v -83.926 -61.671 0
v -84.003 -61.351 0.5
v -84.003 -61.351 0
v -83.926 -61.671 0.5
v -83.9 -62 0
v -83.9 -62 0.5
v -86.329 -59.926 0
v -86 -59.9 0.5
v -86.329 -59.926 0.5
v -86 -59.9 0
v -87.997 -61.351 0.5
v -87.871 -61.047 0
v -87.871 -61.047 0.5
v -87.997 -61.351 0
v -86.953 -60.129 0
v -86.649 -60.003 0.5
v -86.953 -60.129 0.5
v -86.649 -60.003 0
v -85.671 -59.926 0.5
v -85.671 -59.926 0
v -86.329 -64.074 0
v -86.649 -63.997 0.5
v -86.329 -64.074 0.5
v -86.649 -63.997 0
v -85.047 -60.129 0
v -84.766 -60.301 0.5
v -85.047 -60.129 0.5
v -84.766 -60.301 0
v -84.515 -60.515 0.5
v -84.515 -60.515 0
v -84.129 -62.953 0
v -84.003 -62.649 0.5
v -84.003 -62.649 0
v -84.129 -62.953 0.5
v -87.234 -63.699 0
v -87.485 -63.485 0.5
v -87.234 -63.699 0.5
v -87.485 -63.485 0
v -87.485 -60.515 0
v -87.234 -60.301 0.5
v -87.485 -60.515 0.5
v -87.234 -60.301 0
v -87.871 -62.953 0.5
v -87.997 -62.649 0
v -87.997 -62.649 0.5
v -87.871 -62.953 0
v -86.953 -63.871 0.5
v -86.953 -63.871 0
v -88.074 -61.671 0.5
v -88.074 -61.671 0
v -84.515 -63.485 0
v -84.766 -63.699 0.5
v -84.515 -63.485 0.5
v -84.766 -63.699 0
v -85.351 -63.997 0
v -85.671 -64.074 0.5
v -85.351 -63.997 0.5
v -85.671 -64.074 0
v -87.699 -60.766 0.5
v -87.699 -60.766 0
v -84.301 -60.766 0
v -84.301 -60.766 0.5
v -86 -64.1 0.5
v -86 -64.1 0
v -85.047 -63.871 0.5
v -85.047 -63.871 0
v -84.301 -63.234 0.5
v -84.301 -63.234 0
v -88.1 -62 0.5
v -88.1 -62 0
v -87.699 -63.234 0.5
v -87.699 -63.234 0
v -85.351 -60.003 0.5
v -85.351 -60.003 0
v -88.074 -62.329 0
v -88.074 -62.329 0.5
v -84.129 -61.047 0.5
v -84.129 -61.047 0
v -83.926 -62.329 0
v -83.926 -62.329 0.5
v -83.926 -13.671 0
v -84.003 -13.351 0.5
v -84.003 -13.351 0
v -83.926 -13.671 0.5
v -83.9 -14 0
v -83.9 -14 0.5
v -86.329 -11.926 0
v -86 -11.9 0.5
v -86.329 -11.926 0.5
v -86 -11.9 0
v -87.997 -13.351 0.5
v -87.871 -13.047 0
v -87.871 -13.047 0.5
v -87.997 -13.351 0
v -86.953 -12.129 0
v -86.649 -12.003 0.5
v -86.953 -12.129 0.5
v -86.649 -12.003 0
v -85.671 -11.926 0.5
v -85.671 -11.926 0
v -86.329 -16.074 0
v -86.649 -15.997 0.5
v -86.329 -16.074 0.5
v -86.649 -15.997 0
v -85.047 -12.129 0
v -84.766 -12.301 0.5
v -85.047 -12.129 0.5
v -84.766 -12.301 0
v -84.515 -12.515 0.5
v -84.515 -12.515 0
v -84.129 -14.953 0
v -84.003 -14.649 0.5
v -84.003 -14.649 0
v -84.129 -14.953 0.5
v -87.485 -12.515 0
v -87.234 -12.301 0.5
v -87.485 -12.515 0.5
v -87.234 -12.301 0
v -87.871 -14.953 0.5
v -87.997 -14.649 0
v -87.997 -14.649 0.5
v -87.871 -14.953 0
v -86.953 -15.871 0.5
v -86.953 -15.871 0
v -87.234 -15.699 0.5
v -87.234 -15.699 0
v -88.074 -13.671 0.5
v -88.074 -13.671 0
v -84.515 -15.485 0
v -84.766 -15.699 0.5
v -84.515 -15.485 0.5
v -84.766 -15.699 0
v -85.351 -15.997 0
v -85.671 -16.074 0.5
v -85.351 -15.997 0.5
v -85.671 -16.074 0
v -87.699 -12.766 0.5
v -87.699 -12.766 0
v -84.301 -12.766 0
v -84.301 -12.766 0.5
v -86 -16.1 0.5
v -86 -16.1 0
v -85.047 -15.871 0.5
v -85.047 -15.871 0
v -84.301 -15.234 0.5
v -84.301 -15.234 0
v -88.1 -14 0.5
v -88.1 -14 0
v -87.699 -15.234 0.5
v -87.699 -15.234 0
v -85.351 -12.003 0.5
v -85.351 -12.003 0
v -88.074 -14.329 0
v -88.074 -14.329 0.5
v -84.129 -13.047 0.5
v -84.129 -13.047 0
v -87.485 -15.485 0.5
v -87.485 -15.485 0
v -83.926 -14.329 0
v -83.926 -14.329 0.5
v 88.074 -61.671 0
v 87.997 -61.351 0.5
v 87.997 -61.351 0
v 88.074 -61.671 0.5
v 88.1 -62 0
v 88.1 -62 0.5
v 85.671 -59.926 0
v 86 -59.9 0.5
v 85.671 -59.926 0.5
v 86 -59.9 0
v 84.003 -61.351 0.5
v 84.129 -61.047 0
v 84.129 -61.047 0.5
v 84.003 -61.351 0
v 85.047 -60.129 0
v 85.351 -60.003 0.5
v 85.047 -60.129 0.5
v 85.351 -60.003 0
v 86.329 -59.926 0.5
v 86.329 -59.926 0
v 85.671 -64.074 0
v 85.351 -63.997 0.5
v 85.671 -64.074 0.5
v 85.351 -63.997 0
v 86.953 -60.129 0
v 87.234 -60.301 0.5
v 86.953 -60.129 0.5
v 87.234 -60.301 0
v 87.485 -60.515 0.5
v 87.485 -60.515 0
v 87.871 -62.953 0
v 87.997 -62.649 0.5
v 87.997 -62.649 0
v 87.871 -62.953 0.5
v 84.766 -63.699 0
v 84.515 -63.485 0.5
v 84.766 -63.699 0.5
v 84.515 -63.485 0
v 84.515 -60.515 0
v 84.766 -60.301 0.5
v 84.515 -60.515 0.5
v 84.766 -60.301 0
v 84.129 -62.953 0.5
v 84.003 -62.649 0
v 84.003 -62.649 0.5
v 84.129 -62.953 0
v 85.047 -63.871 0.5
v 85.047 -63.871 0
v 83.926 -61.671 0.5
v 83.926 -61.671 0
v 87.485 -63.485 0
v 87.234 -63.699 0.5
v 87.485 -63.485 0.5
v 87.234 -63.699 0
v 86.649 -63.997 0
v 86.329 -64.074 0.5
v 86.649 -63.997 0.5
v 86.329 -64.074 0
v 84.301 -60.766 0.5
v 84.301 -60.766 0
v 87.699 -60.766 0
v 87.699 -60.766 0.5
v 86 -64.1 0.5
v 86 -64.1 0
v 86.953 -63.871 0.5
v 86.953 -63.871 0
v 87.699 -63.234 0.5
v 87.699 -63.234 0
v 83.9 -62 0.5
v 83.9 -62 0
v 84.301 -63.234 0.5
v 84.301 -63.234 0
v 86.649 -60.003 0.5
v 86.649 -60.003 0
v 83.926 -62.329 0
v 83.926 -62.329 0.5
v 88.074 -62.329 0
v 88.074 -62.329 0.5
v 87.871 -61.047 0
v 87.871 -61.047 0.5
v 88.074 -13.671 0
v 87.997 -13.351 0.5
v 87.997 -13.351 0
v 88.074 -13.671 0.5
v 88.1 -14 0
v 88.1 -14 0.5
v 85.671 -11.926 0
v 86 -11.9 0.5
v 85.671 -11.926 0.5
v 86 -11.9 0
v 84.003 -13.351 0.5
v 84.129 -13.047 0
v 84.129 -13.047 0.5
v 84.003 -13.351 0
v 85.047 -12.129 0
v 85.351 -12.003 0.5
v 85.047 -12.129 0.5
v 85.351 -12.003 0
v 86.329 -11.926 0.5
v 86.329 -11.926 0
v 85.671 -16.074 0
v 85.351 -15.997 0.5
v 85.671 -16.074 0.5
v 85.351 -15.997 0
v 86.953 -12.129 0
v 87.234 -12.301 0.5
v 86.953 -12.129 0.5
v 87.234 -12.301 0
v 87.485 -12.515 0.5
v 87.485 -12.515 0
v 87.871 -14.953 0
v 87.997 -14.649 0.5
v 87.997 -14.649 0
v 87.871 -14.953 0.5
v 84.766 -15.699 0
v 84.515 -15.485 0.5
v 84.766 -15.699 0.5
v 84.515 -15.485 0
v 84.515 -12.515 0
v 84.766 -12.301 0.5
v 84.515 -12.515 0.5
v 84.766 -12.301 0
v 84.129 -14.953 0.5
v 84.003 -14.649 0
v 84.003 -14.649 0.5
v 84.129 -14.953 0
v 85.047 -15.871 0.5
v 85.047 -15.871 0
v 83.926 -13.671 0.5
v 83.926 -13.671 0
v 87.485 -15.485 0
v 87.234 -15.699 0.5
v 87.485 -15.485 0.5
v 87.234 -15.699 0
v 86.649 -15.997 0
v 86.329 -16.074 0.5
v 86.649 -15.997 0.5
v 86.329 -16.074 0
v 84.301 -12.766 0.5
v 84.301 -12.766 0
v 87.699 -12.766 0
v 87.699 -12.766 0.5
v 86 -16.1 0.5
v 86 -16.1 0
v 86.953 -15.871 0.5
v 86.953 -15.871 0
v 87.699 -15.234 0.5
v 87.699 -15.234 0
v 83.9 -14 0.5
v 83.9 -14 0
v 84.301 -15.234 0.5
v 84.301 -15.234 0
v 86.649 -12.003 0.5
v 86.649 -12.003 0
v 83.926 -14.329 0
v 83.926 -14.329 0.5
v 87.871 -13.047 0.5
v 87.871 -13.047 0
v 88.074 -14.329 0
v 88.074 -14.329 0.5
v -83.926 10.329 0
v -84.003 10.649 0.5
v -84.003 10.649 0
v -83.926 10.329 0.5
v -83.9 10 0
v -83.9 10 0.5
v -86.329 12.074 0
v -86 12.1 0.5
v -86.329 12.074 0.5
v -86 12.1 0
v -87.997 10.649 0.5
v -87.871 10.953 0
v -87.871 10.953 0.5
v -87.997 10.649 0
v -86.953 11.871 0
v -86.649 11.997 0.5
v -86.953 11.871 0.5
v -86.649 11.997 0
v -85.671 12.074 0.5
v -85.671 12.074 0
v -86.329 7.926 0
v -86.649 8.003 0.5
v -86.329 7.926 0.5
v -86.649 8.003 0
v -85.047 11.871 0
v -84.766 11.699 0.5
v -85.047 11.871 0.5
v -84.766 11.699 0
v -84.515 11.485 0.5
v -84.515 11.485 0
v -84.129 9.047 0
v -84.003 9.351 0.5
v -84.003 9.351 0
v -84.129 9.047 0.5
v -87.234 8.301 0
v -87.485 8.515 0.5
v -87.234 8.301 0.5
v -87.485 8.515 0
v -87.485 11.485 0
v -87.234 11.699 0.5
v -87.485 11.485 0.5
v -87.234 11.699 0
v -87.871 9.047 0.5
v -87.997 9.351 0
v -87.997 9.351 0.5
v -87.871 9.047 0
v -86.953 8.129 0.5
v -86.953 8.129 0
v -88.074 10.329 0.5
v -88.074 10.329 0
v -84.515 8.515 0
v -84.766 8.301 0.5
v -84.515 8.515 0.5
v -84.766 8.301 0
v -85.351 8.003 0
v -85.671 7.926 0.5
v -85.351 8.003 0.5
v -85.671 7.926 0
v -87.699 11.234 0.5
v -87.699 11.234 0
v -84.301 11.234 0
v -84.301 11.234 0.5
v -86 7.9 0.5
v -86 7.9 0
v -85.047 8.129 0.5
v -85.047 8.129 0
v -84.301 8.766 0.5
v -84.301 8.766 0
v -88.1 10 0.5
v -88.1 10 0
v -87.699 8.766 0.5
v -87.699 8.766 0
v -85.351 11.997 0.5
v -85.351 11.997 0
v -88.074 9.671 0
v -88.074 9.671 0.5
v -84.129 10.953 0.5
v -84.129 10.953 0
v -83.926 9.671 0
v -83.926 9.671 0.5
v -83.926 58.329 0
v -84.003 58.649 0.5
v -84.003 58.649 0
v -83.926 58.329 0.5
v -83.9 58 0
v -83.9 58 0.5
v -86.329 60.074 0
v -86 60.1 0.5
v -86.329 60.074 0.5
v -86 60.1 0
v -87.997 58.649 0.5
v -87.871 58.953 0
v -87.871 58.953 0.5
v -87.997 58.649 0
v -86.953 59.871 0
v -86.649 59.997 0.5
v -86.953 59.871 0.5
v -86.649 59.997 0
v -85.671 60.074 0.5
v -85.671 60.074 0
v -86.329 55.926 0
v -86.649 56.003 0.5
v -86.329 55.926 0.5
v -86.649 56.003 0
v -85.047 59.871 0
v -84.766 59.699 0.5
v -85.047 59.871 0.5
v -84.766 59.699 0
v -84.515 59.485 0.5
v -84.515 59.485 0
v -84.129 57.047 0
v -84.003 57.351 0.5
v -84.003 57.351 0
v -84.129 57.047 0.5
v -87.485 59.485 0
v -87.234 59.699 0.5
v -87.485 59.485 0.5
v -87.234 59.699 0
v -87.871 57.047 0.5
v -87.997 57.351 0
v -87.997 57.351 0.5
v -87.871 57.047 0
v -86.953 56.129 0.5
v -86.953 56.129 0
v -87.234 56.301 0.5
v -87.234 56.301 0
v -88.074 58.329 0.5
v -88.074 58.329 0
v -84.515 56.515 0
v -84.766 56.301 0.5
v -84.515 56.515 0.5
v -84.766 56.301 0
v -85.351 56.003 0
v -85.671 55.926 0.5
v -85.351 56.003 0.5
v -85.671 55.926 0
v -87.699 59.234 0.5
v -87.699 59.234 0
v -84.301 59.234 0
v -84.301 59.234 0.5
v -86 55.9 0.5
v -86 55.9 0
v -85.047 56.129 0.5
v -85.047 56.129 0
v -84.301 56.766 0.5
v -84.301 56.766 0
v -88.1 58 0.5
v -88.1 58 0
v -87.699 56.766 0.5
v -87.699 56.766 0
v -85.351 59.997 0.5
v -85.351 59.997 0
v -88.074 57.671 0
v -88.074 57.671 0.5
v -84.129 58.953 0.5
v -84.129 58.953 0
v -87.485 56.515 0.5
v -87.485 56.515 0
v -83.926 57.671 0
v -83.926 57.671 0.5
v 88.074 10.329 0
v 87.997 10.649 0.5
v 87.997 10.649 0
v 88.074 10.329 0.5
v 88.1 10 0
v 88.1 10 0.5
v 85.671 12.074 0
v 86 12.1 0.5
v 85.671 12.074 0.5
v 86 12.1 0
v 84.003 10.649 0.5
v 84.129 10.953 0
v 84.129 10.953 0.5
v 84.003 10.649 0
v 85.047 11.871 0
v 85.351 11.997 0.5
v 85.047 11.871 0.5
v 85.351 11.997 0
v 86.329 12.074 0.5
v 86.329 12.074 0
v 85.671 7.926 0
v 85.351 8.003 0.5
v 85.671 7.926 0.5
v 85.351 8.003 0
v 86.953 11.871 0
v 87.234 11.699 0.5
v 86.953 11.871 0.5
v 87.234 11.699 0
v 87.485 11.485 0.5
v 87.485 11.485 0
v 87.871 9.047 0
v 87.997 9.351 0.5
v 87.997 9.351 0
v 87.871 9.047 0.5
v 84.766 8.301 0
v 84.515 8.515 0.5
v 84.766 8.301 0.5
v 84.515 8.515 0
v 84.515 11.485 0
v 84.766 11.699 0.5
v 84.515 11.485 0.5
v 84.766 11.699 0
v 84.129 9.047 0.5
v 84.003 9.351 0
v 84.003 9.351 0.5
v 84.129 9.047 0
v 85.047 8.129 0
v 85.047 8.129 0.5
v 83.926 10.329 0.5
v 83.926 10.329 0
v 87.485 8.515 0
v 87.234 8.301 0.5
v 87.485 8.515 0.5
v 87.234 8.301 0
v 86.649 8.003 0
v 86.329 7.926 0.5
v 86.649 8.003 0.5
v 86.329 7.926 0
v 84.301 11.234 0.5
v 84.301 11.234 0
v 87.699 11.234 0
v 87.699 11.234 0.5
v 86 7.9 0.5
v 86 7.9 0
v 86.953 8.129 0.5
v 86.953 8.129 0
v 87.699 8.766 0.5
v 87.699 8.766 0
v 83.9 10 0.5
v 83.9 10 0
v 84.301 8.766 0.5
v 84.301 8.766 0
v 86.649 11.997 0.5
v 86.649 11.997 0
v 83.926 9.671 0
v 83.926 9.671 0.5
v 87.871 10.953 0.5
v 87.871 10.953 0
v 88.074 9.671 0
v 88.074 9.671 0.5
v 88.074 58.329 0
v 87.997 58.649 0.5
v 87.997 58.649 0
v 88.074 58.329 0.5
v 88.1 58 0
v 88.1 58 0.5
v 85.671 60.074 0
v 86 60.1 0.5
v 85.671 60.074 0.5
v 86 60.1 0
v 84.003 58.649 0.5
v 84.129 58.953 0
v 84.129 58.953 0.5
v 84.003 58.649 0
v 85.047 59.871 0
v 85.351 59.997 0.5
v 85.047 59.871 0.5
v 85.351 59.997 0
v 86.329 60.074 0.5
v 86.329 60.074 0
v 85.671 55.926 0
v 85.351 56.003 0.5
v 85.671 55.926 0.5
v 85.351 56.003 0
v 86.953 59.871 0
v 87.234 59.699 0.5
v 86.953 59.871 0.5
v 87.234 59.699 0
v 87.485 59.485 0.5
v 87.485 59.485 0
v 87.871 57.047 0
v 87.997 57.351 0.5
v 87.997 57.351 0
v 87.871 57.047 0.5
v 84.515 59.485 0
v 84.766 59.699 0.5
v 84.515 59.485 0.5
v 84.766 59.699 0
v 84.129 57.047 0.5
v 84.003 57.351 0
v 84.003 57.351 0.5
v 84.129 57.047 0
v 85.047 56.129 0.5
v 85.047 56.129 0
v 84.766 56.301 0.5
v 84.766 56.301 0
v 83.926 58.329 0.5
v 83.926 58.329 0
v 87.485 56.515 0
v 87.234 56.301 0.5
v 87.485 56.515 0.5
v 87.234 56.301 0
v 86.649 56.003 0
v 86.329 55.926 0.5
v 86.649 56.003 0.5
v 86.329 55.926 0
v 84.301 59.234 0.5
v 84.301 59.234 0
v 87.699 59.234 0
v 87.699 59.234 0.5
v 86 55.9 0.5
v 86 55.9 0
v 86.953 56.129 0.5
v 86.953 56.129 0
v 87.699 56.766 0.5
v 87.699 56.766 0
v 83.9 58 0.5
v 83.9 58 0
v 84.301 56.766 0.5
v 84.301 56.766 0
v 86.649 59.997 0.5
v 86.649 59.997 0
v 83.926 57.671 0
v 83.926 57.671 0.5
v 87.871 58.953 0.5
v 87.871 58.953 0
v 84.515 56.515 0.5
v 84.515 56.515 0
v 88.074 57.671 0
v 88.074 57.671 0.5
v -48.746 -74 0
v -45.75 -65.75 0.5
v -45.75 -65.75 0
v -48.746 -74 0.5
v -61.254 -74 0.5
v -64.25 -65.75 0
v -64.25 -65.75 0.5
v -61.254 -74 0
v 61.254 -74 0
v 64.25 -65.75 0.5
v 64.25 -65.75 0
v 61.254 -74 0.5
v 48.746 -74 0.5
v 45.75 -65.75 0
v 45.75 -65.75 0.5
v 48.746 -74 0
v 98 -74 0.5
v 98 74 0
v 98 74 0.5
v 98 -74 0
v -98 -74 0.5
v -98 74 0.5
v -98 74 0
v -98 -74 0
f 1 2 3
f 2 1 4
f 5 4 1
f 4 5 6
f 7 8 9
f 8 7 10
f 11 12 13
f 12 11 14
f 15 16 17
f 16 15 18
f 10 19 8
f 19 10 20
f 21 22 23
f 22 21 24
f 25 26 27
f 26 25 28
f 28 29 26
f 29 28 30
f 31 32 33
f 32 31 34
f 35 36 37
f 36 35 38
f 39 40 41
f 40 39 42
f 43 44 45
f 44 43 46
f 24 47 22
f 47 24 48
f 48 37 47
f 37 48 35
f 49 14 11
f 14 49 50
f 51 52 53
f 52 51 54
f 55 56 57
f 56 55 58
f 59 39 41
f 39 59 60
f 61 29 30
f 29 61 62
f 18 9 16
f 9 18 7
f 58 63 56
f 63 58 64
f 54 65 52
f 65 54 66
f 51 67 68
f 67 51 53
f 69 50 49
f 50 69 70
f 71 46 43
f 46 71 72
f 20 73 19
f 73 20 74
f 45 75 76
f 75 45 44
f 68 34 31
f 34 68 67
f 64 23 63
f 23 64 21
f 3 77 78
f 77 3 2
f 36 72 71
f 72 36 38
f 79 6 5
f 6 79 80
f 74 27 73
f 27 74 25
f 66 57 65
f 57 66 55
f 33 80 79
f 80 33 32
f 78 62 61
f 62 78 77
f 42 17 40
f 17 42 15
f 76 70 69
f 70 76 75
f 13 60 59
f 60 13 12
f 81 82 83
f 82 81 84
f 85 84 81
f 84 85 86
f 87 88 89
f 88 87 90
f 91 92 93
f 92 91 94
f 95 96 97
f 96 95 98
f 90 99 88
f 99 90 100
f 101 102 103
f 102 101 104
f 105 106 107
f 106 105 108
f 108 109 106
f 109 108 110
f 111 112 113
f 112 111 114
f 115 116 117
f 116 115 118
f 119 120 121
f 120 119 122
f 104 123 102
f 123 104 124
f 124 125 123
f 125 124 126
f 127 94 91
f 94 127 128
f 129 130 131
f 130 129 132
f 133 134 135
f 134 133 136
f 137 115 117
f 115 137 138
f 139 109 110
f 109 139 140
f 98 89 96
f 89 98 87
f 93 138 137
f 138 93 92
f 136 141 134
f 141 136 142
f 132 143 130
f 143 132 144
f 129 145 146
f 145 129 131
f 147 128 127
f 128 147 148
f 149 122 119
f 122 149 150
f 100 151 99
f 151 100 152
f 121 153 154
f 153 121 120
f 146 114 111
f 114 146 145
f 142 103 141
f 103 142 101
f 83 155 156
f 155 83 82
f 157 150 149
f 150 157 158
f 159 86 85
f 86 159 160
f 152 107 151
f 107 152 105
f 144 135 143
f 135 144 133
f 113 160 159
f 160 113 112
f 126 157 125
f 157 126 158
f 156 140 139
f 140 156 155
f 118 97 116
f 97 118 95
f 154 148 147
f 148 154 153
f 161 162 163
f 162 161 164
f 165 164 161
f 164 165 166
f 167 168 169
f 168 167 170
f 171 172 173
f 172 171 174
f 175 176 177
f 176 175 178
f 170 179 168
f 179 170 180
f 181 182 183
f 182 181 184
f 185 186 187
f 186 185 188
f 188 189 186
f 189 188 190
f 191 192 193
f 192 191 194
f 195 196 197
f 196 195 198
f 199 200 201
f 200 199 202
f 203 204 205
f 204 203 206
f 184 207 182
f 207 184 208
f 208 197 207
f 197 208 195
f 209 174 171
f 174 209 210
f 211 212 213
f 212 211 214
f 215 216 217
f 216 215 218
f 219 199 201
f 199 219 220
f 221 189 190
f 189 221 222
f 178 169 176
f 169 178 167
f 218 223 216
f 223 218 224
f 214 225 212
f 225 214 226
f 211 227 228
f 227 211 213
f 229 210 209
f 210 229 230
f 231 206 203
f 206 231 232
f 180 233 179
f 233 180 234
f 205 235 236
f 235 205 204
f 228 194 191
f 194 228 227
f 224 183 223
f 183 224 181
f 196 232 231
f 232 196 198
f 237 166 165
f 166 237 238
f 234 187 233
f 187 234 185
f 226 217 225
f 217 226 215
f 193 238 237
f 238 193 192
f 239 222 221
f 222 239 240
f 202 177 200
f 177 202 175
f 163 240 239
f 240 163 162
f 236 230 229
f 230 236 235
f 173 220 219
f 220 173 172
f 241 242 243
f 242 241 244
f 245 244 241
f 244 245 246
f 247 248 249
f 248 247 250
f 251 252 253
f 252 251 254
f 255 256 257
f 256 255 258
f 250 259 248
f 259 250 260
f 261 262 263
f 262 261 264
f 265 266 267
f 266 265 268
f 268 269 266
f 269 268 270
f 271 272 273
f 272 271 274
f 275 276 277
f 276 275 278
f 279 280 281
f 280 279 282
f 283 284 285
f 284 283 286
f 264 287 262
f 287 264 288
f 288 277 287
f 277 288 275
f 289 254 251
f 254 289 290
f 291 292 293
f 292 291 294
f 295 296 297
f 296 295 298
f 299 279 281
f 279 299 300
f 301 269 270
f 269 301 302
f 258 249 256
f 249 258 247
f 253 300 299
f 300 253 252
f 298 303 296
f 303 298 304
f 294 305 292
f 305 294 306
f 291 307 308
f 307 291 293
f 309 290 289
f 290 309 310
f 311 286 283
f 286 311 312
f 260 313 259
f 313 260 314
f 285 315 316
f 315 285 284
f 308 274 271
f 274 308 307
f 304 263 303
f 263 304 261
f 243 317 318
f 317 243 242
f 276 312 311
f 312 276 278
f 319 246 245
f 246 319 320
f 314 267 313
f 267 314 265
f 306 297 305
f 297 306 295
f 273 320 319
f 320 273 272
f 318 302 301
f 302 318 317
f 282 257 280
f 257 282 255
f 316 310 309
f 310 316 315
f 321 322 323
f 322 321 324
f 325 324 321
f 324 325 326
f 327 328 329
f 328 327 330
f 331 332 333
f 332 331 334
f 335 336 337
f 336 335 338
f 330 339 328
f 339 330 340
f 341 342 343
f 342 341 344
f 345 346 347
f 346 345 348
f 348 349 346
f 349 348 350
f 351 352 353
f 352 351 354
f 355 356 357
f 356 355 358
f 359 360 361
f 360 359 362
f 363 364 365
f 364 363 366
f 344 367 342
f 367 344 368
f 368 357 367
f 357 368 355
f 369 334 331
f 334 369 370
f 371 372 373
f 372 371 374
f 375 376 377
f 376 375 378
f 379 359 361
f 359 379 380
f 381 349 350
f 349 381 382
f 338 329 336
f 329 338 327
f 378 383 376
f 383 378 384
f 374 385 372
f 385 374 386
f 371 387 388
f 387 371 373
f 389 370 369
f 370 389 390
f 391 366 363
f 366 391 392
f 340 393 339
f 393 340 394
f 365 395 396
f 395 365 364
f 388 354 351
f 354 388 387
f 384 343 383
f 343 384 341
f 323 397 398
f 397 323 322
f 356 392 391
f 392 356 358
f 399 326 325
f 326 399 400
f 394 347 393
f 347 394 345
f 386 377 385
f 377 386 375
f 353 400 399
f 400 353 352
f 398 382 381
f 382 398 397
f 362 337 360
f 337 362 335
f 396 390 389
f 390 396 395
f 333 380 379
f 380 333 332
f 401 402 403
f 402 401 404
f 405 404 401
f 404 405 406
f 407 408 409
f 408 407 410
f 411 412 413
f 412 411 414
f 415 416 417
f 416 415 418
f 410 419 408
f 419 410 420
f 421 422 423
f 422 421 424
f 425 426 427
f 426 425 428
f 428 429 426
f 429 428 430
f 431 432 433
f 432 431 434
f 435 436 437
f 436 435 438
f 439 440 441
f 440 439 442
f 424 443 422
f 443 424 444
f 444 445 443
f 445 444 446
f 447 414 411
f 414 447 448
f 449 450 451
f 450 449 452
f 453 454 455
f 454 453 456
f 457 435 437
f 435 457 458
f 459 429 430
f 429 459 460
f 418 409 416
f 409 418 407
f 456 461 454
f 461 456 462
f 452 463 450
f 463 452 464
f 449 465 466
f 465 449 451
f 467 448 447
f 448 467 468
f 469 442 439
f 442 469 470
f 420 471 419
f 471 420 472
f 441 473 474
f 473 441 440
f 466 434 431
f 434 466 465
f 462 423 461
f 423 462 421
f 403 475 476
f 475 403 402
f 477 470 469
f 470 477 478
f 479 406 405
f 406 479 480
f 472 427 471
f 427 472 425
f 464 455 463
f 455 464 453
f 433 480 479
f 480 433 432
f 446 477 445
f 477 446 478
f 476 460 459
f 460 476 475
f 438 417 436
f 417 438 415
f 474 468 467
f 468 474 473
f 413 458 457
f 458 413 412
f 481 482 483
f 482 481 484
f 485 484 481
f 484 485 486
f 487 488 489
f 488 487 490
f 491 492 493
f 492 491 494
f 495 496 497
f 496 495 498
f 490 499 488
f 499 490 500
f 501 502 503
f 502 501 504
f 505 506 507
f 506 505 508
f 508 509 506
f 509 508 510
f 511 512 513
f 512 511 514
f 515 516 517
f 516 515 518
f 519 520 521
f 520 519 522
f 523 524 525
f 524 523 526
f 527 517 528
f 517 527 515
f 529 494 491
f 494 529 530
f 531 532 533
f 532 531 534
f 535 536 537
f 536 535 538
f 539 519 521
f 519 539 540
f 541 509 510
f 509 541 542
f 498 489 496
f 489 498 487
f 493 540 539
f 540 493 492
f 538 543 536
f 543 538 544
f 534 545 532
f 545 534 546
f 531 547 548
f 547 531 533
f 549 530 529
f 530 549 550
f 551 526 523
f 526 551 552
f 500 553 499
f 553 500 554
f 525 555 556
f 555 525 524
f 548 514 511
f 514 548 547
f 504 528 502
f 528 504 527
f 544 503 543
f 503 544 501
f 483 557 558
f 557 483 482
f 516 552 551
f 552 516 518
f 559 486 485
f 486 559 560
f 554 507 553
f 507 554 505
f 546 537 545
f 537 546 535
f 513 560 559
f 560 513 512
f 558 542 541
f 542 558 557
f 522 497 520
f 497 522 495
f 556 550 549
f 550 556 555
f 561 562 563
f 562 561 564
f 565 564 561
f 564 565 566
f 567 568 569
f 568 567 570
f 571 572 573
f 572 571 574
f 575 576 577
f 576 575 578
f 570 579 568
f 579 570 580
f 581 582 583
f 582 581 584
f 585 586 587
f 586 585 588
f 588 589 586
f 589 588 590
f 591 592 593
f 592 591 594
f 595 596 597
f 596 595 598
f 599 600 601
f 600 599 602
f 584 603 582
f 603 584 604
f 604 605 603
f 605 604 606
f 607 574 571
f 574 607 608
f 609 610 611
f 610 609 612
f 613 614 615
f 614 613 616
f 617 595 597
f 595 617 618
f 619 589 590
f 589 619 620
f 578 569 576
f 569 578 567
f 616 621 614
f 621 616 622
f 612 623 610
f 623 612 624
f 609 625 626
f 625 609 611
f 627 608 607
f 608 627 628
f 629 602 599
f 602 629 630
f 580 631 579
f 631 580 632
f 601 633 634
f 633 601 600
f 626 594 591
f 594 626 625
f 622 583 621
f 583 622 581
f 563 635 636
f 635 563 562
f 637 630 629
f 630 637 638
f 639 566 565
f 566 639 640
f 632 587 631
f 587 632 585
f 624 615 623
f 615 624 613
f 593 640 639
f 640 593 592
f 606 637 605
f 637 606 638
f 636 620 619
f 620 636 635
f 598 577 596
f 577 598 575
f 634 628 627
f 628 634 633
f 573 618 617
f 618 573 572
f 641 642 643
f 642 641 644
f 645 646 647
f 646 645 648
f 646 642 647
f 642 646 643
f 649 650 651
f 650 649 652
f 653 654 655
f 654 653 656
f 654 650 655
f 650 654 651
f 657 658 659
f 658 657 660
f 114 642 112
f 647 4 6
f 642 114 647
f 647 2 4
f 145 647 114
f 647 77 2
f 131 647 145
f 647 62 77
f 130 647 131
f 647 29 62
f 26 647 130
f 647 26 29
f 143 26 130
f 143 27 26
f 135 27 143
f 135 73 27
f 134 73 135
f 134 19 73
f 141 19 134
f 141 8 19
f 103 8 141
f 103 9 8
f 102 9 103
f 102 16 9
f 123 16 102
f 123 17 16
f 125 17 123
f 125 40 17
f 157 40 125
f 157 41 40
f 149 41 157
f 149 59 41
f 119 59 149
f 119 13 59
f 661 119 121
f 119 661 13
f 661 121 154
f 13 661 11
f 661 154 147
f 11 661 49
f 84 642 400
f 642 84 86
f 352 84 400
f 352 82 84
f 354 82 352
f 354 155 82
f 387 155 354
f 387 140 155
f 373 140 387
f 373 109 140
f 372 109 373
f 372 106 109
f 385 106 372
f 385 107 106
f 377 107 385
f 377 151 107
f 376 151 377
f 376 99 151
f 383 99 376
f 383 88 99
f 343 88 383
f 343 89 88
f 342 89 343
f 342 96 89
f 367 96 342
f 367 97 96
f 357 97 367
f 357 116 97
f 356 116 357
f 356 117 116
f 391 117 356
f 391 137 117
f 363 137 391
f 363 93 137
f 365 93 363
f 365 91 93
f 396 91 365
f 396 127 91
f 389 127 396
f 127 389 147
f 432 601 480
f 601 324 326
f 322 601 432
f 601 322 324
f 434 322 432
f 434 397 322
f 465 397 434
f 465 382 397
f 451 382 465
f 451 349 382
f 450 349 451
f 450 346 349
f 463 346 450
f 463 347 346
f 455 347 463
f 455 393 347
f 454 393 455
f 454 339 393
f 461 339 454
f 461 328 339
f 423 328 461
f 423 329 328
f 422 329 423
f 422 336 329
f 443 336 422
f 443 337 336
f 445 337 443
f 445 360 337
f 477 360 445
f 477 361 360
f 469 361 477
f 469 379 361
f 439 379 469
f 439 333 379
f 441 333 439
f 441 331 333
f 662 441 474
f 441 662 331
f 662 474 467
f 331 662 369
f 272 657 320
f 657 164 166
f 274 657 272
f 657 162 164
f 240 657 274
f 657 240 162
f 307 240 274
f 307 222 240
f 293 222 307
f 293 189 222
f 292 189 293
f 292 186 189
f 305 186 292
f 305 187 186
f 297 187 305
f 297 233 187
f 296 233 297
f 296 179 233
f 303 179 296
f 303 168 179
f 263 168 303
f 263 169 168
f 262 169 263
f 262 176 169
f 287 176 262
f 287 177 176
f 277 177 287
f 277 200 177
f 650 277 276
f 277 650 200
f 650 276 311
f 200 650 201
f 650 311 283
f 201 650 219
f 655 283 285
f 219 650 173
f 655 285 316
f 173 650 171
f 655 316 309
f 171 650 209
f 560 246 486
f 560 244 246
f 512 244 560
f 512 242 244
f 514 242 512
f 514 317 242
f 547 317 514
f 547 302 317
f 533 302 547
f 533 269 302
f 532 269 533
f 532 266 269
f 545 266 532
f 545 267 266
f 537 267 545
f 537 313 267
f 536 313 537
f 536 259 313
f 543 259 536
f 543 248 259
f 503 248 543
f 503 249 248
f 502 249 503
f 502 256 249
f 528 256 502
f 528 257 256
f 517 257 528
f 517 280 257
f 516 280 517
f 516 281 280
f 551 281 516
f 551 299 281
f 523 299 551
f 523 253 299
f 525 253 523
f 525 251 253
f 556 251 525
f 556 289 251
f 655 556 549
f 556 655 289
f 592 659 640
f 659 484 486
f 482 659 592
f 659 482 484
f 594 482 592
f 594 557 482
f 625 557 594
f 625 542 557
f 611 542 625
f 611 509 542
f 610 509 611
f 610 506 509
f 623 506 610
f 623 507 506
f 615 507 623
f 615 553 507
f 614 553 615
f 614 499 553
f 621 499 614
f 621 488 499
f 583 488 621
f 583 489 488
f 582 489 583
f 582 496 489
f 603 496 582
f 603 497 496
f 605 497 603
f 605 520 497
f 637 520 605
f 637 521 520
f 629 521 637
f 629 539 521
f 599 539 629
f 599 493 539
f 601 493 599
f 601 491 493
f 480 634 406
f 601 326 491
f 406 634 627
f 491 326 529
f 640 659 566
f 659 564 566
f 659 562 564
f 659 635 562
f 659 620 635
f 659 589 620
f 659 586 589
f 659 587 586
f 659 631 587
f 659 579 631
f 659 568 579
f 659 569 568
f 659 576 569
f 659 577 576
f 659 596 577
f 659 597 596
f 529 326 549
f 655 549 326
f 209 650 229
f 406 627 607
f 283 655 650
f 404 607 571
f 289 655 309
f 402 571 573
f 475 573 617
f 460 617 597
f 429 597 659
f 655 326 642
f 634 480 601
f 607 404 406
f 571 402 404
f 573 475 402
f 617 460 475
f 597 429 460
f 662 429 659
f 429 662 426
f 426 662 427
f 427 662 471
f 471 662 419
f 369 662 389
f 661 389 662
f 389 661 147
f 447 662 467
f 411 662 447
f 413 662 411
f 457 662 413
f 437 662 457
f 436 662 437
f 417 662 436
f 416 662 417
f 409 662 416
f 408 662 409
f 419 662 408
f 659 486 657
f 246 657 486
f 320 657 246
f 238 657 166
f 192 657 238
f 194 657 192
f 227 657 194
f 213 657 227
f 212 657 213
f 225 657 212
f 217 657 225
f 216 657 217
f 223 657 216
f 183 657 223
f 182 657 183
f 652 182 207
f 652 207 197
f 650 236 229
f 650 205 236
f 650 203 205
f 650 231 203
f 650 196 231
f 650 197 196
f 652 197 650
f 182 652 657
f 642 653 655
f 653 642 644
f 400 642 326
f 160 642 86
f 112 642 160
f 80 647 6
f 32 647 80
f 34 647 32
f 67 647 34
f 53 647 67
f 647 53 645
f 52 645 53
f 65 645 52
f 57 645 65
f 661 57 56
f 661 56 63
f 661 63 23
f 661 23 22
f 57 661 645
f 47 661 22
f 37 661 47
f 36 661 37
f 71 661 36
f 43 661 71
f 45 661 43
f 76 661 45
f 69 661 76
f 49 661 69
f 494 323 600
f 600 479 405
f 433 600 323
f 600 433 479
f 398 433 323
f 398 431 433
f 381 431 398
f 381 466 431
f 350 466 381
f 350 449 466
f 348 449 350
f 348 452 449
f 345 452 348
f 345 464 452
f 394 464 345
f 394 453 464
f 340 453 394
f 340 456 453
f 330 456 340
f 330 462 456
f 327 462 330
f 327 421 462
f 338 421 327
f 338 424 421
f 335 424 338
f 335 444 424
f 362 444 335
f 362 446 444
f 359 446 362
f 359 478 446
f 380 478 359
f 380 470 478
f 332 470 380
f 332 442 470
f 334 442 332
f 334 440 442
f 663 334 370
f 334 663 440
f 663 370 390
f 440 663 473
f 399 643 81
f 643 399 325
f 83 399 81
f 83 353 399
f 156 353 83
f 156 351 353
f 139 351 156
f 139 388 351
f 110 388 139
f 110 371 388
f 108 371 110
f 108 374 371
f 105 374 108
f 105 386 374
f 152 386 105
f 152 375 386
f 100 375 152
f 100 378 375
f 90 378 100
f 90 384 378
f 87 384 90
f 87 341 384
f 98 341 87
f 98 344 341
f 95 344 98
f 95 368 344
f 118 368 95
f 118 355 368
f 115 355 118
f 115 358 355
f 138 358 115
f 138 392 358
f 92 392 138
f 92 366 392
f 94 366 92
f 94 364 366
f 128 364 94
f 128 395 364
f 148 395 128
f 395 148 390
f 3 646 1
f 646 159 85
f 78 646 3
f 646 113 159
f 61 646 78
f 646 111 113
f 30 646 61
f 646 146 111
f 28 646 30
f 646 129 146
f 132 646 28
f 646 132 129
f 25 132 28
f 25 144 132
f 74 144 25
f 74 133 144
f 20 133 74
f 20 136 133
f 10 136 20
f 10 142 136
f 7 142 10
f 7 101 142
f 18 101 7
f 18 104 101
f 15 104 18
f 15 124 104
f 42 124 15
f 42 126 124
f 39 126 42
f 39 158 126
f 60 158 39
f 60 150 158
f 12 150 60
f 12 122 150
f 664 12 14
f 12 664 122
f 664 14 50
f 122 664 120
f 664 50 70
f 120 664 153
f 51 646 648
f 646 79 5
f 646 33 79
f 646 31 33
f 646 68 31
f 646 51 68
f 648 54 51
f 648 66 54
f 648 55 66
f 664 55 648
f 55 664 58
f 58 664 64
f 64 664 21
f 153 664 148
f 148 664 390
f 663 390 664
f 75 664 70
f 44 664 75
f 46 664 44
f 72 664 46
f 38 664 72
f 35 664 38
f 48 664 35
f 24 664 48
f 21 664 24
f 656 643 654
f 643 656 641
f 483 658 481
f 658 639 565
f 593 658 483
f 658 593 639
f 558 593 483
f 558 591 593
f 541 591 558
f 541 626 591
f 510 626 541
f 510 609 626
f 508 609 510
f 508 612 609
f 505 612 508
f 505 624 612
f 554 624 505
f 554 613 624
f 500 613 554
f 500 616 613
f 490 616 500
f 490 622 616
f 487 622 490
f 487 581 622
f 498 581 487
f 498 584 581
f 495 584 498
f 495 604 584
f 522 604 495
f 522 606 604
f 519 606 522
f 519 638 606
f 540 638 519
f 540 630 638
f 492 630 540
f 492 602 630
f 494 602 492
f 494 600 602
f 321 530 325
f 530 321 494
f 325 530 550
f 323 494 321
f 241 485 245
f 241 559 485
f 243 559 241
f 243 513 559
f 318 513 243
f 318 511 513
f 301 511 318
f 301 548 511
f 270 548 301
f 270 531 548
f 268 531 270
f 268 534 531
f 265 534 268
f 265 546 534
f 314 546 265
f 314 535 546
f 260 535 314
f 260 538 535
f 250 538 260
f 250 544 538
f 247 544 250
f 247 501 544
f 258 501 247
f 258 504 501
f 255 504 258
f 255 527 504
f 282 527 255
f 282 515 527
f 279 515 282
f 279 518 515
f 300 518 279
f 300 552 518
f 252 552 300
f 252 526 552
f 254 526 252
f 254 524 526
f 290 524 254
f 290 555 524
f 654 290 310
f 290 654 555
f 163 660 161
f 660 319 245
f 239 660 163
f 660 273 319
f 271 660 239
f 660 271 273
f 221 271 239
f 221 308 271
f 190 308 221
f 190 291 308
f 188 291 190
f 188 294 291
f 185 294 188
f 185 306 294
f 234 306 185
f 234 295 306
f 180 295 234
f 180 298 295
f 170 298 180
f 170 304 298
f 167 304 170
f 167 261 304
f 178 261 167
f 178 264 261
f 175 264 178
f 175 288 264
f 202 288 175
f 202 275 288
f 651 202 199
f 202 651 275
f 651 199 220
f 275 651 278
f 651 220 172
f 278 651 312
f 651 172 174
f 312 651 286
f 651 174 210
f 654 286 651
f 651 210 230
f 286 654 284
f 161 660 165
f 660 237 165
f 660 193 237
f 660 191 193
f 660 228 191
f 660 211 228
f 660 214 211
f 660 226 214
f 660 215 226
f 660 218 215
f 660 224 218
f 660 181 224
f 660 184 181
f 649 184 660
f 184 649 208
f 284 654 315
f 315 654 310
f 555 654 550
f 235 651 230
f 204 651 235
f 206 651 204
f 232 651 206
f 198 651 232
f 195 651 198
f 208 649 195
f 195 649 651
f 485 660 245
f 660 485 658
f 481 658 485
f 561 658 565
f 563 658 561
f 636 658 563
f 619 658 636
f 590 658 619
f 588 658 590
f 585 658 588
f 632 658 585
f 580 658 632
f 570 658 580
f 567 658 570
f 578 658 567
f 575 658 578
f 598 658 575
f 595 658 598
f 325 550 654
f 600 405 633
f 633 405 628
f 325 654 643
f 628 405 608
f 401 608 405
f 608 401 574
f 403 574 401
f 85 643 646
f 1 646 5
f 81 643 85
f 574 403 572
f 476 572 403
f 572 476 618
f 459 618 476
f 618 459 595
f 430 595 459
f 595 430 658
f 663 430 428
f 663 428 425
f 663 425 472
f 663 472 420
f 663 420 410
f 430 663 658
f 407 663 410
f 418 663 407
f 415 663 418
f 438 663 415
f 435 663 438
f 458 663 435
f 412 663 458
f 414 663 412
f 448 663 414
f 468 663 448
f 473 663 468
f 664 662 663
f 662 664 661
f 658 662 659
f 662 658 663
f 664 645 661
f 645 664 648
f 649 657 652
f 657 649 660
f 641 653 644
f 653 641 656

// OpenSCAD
include <../lib/filament-spool-roller-lib.scad>;
$fn = 40;

// Print plate 12: the floor drilling template, right half.
color("#ff17c7") plate_floor_template(1);
